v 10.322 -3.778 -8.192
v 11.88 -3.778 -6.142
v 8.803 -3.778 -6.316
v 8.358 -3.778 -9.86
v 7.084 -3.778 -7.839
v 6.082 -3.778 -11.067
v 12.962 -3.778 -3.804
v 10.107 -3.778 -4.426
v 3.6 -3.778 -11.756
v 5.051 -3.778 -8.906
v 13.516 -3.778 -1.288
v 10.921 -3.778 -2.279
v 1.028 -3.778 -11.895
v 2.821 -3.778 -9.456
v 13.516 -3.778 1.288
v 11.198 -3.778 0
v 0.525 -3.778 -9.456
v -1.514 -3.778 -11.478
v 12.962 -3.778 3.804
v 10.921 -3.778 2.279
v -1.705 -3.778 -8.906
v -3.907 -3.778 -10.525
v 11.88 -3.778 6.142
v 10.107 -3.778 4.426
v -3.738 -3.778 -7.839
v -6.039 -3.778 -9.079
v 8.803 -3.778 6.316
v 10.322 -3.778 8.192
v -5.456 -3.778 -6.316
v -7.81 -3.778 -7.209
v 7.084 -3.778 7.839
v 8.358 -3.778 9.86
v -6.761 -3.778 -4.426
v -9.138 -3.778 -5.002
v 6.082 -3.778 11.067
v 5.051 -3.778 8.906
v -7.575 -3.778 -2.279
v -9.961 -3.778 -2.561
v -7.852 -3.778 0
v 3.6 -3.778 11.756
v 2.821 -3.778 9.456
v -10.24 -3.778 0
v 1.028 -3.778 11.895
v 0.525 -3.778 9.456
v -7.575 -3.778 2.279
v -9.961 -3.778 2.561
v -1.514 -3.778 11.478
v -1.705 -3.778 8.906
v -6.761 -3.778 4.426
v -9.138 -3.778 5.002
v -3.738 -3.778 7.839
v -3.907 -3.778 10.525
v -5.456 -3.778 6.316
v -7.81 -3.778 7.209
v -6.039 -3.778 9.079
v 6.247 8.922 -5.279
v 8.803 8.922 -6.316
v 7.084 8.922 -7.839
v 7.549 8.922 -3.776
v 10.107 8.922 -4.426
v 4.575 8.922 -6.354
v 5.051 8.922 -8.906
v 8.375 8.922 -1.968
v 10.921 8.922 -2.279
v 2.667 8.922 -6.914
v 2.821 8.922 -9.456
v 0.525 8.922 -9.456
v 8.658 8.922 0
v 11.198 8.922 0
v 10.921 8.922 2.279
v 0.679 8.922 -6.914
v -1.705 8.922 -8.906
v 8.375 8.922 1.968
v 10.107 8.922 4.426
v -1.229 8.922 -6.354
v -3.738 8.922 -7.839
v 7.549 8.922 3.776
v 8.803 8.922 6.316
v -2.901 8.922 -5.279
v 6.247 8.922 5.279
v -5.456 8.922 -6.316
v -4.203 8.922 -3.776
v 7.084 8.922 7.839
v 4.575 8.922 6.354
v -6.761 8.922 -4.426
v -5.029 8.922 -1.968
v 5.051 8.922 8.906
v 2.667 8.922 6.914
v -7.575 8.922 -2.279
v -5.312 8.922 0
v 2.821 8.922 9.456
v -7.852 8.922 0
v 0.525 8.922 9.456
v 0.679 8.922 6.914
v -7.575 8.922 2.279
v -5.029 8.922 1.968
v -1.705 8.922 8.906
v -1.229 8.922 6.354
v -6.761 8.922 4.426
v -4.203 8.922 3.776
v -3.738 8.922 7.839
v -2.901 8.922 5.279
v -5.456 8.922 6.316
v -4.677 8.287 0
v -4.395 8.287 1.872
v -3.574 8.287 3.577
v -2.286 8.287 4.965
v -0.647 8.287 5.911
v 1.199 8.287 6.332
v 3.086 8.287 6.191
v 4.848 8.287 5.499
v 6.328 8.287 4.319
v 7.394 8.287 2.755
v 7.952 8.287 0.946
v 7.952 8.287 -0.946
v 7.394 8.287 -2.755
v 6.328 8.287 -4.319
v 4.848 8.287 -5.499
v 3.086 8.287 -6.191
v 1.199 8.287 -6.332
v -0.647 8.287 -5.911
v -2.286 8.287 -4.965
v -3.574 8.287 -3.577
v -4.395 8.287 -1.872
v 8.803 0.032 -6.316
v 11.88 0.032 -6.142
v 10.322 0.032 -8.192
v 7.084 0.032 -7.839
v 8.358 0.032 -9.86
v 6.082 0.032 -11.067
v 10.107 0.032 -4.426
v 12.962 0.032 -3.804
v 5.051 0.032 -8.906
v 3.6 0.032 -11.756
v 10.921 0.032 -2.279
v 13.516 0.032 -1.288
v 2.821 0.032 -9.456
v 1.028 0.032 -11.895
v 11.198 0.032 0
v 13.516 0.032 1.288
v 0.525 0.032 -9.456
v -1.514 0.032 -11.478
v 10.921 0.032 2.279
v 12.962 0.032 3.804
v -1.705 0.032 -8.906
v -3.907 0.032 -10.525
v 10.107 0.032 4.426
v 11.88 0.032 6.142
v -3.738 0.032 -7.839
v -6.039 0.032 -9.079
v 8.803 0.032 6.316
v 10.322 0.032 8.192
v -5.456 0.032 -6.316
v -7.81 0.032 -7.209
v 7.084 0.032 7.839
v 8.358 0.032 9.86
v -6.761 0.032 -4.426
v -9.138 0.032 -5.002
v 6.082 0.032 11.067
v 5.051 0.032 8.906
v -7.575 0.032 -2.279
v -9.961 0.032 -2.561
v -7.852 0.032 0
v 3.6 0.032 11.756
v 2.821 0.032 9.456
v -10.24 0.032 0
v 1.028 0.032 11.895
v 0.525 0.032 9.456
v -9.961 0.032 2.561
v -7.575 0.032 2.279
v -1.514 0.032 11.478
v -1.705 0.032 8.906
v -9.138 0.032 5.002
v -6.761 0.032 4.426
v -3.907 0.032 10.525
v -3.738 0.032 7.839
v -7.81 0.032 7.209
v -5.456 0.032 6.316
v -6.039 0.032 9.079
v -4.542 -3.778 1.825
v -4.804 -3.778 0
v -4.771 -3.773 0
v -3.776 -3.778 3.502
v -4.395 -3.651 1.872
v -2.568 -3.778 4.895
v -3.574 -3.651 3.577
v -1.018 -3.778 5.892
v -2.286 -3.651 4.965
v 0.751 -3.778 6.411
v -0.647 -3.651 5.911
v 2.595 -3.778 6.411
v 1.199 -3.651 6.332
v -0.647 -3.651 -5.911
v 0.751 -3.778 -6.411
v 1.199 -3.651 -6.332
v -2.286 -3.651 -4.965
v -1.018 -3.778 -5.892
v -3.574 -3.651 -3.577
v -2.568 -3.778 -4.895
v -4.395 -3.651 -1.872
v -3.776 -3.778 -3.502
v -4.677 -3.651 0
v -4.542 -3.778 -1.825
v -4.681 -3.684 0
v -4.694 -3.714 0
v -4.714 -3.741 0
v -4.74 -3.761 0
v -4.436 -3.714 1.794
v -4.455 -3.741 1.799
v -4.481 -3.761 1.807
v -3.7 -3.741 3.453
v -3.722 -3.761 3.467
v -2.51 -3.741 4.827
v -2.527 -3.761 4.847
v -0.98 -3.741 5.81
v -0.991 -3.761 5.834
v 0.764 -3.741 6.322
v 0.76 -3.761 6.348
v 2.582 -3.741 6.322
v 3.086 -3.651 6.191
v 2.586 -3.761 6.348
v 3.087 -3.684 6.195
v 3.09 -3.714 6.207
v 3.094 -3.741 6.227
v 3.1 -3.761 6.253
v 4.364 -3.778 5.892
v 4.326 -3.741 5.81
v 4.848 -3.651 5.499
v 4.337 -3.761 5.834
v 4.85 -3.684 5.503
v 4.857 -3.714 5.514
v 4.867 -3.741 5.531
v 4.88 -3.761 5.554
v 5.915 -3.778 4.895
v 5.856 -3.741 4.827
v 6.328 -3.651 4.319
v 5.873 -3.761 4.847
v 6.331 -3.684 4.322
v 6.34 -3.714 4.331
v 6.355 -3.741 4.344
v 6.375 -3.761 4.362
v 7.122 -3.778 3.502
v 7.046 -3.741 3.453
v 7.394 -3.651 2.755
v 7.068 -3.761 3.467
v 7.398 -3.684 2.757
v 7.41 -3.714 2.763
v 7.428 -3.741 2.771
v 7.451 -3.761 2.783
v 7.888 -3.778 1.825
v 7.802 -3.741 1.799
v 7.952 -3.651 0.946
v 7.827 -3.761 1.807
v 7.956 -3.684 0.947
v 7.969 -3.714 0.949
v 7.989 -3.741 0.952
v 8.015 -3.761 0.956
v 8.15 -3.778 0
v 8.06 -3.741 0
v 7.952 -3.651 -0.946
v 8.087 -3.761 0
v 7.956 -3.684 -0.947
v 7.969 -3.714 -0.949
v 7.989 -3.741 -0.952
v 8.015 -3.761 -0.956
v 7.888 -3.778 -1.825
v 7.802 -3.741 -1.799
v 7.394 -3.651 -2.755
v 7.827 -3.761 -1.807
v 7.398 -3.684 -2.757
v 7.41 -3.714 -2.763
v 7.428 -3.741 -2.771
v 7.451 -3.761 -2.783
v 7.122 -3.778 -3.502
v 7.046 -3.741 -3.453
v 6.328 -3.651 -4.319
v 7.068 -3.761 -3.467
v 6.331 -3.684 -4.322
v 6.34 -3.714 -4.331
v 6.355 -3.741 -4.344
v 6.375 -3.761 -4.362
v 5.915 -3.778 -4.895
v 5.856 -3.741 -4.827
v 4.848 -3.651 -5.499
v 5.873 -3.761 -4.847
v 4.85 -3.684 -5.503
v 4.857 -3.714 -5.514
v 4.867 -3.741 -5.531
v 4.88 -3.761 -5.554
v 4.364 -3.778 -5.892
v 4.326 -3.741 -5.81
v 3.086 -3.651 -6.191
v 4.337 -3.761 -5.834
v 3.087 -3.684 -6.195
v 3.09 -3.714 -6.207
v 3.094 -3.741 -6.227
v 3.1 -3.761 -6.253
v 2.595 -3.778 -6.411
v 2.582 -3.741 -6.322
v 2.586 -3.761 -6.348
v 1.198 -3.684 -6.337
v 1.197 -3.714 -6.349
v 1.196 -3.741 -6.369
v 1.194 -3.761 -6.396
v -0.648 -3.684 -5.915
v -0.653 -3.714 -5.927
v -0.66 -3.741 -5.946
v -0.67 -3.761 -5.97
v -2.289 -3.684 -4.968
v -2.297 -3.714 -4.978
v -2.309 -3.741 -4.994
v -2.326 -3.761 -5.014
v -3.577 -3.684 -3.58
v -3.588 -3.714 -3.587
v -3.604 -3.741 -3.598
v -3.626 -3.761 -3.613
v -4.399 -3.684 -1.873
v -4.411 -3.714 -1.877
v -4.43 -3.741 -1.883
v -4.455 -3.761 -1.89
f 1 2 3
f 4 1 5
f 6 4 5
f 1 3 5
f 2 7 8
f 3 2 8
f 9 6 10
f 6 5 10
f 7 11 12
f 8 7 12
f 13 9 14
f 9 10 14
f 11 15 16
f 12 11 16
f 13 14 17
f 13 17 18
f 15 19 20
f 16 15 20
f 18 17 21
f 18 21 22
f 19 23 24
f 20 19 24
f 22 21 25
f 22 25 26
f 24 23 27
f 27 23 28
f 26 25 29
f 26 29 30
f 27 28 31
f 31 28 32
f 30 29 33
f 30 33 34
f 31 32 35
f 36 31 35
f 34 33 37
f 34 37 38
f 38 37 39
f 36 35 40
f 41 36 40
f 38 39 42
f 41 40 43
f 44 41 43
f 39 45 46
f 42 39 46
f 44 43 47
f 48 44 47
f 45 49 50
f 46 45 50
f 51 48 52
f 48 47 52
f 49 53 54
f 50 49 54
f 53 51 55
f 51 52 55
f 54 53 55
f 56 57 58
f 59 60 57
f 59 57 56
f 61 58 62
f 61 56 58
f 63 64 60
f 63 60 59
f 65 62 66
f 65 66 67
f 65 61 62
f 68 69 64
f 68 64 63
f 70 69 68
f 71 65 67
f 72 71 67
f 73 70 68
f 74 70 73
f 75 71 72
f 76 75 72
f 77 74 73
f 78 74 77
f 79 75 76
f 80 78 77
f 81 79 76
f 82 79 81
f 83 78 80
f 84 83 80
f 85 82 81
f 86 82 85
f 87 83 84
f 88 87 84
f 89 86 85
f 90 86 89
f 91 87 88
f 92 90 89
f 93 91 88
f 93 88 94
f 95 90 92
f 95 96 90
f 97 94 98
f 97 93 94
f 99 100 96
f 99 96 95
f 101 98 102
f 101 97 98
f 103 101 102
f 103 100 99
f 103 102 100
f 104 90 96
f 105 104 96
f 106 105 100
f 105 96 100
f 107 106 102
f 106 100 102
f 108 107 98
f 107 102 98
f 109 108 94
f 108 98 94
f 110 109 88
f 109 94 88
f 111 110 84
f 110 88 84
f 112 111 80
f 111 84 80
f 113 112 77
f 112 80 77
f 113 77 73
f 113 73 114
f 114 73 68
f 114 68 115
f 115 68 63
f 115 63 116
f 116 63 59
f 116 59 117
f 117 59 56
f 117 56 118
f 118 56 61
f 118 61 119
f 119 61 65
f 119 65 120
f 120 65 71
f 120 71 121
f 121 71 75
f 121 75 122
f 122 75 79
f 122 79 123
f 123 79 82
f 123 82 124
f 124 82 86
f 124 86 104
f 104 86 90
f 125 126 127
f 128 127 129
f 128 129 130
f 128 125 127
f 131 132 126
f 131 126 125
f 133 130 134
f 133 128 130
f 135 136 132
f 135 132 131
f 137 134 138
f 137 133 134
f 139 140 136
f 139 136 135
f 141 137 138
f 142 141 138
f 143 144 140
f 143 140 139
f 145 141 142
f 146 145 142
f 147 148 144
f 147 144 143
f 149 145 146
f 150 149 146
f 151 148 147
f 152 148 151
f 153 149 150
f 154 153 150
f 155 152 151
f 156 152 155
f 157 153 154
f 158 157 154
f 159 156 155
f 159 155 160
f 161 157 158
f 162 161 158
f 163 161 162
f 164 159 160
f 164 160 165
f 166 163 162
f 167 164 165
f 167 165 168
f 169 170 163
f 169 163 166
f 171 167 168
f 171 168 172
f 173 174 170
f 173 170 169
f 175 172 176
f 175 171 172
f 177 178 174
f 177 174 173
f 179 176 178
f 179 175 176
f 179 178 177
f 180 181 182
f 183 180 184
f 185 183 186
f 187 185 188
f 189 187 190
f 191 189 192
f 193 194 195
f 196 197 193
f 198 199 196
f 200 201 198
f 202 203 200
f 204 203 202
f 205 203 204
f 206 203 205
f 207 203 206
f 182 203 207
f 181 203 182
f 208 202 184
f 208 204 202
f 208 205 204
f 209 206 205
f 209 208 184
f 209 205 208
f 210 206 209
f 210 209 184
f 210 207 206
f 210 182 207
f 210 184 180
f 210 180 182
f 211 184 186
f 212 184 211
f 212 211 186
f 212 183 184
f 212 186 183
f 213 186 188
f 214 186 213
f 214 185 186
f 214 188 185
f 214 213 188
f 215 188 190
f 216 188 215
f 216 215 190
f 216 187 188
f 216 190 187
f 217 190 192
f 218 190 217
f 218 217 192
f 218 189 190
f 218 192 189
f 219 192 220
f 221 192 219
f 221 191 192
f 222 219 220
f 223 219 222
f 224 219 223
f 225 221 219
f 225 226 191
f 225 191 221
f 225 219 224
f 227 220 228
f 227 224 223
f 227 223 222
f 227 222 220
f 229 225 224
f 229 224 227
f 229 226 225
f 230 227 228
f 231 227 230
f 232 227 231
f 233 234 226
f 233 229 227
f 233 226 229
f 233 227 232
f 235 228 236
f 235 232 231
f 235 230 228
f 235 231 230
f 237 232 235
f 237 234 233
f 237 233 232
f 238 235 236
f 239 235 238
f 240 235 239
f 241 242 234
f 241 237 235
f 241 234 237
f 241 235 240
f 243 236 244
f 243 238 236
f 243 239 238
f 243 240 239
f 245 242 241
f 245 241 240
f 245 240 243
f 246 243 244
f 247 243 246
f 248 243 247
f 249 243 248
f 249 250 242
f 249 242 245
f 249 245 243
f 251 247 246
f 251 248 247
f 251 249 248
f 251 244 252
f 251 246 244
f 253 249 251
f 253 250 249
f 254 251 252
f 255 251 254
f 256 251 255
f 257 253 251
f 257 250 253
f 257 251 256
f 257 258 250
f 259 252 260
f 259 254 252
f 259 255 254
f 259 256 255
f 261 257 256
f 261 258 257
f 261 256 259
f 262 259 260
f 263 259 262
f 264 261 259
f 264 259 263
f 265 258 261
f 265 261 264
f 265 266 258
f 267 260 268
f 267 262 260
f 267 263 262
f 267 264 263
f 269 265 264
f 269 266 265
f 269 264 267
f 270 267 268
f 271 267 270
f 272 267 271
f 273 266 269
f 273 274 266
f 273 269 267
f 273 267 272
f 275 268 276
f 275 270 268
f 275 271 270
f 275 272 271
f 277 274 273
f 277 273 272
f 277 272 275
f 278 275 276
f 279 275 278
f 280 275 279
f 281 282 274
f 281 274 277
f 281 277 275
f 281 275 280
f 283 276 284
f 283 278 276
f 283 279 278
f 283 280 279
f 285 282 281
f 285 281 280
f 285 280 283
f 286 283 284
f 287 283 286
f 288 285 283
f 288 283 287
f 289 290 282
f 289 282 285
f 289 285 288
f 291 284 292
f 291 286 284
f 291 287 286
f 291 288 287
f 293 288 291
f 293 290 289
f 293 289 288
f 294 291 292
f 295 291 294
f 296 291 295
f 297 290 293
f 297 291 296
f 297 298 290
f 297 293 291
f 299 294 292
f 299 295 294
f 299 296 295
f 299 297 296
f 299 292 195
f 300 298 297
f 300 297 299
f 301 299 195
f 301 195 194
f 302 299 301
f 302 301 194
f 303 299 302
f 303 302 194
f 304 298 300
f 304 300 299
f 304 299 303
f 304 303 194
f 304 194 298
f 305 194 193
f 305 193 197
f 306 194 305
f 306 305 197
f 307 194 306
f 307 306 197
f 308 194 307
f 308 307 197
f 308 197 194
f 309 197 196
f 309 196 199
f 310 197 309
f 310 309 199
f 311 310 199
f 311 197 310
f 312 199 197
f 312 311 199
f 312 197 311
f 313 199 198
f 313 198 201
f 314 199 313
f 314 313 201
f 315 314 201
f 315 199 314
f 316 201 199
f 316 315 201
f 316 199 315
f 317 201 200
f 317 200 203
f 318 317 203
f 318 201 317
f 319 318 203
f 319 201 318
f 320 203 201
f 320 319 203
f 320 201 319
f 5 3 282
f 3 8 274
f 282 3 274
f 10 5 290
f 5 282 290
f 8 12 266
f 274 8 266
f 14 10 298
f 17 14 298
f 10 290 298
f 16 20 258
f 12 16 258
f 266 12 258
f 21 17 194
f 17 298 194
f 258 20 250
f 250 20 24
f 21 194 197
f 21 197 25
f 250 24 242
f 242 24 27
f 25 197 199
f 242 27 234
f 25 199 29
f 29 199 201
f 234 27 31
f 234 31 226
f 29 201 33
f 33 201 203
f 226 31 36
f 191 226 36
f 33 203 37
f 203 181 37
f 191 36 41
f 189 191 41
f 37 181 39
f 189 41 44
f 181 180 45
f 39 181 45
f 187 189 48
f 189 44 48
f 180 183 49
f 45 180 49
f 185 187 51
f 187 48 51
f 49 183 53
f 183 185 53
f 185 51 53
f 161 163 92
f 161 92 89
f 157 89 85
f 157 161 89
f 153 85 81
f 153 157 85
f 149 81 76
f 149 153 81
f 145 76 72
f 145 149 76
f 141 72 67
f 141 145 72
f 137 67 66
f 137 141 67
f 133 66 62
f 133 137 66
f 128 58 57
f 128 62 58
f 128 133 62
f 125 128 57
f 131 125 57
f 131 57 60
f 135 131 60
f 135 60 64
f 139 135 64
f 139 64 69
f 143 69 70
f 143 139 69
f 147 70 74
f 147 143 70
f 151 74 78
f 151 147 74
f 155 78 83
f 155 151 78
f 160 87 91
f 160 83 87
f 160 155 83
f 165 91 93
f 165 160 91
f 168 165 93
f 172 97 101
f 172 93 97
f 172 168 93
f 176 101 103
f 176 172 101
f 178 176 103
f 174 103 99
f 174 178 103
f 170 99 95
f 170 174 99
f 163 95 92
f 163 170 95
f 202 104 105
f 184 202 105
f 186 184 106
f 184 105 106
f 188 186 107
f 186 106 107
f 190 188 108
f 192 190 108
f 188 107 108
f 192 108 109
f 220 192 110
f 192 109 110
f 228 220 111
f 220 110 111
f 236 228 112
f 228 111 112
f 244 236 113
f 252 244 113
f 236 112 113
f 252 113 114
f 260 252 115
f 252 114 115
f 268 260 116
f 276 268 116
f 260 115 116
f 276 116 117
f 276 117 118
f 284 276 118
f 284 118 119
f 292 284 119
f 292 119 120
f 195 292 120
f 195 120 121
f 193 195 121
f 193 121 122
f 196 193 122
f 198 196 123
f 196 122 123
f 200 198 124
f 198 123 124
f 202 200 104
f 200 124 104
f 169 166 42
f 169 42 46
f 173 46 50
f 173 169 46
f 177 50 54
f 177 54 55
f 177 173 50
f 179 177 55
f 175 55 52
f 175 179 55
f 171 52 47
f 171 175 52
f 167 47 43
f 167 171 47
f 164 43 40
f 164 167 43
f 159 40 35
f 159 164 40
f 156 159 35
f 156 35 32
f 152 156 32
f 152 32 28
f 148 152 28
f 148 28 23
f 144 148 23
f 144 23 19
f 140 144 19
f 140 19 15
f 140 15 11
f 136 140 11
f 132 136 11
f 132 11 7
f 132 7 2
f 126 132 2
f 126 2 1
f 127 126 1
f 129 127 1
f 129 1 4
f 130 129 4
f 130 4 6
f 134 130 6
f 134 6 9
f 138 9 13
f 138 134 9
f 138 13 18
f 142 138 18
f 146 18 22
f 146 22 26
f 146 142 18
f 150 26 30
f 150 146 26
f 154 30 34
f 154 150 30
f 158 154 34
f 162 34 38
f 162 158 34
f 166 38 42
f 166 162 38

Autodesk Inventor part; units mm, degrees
ref_plane "YZ Plane" through (0, 0, 0) normal (1, 0, 0) x (0, 1, 0)
ref_plane "XZ Plane" through (0, 0, 0) normal (0, 1, 0) x (-1, 0, 0)
ref_plane "XY Plane" through (0, 0, 0) normal (0, 0, 1) x (1, 0, 0)
sketch "Sketch1" plane through (0, 0, 0) normal (0, 0, 1) x (1, 0, 0)
  line L0 (-4.6769, 8.9222) -> (-7.8519, 8.9222)
  line L1 (-7.8519, 8.9222) -> (-7.8519, 0.0322)
  line L2 (-7.8519, -3.7778) -> (-4.6769, -3.7778)
  line L3 (1.6731, -3.7778) -> (1.6731, 8.9222)
  line L4 (-4.6769, -3.7778) -> (-10.2395, -3.7778)
  line L5 (-10.2395, -3.7778) -> (-10.2395, 0.0322)
  line L6 (-10.2395, 0.0322) -> (-7.8519, 0.0322)
  line L7 (1.6731, 3.6296) -> (1.6731, -3.7778)
  line L8 (-4.6769, -3.7778) -> (-4.6769, 8.9222)
  point P0 (0, 0)
  dimension "d0" = 12.7
  dimension "d1" = 11.9126
  dimension "d2" = 9.525
  dimension "d3" = 6.35
  dimension "d4" = 3.81
revolve "Revolution1" add sketch "Sketch1" angle 360 about axis through (1.6731, -3.7778, 0) along (0, 1, 0)
chamfer "Chamfer1" distance 0.635 angle 45 1 edges at (8.0231, 8.9222, 0)
fillet "Fillet1" radius 0.127 1 edges at (8.0231, -3.7778, 0)
properties part number "Ratchet Bushing 1764"
